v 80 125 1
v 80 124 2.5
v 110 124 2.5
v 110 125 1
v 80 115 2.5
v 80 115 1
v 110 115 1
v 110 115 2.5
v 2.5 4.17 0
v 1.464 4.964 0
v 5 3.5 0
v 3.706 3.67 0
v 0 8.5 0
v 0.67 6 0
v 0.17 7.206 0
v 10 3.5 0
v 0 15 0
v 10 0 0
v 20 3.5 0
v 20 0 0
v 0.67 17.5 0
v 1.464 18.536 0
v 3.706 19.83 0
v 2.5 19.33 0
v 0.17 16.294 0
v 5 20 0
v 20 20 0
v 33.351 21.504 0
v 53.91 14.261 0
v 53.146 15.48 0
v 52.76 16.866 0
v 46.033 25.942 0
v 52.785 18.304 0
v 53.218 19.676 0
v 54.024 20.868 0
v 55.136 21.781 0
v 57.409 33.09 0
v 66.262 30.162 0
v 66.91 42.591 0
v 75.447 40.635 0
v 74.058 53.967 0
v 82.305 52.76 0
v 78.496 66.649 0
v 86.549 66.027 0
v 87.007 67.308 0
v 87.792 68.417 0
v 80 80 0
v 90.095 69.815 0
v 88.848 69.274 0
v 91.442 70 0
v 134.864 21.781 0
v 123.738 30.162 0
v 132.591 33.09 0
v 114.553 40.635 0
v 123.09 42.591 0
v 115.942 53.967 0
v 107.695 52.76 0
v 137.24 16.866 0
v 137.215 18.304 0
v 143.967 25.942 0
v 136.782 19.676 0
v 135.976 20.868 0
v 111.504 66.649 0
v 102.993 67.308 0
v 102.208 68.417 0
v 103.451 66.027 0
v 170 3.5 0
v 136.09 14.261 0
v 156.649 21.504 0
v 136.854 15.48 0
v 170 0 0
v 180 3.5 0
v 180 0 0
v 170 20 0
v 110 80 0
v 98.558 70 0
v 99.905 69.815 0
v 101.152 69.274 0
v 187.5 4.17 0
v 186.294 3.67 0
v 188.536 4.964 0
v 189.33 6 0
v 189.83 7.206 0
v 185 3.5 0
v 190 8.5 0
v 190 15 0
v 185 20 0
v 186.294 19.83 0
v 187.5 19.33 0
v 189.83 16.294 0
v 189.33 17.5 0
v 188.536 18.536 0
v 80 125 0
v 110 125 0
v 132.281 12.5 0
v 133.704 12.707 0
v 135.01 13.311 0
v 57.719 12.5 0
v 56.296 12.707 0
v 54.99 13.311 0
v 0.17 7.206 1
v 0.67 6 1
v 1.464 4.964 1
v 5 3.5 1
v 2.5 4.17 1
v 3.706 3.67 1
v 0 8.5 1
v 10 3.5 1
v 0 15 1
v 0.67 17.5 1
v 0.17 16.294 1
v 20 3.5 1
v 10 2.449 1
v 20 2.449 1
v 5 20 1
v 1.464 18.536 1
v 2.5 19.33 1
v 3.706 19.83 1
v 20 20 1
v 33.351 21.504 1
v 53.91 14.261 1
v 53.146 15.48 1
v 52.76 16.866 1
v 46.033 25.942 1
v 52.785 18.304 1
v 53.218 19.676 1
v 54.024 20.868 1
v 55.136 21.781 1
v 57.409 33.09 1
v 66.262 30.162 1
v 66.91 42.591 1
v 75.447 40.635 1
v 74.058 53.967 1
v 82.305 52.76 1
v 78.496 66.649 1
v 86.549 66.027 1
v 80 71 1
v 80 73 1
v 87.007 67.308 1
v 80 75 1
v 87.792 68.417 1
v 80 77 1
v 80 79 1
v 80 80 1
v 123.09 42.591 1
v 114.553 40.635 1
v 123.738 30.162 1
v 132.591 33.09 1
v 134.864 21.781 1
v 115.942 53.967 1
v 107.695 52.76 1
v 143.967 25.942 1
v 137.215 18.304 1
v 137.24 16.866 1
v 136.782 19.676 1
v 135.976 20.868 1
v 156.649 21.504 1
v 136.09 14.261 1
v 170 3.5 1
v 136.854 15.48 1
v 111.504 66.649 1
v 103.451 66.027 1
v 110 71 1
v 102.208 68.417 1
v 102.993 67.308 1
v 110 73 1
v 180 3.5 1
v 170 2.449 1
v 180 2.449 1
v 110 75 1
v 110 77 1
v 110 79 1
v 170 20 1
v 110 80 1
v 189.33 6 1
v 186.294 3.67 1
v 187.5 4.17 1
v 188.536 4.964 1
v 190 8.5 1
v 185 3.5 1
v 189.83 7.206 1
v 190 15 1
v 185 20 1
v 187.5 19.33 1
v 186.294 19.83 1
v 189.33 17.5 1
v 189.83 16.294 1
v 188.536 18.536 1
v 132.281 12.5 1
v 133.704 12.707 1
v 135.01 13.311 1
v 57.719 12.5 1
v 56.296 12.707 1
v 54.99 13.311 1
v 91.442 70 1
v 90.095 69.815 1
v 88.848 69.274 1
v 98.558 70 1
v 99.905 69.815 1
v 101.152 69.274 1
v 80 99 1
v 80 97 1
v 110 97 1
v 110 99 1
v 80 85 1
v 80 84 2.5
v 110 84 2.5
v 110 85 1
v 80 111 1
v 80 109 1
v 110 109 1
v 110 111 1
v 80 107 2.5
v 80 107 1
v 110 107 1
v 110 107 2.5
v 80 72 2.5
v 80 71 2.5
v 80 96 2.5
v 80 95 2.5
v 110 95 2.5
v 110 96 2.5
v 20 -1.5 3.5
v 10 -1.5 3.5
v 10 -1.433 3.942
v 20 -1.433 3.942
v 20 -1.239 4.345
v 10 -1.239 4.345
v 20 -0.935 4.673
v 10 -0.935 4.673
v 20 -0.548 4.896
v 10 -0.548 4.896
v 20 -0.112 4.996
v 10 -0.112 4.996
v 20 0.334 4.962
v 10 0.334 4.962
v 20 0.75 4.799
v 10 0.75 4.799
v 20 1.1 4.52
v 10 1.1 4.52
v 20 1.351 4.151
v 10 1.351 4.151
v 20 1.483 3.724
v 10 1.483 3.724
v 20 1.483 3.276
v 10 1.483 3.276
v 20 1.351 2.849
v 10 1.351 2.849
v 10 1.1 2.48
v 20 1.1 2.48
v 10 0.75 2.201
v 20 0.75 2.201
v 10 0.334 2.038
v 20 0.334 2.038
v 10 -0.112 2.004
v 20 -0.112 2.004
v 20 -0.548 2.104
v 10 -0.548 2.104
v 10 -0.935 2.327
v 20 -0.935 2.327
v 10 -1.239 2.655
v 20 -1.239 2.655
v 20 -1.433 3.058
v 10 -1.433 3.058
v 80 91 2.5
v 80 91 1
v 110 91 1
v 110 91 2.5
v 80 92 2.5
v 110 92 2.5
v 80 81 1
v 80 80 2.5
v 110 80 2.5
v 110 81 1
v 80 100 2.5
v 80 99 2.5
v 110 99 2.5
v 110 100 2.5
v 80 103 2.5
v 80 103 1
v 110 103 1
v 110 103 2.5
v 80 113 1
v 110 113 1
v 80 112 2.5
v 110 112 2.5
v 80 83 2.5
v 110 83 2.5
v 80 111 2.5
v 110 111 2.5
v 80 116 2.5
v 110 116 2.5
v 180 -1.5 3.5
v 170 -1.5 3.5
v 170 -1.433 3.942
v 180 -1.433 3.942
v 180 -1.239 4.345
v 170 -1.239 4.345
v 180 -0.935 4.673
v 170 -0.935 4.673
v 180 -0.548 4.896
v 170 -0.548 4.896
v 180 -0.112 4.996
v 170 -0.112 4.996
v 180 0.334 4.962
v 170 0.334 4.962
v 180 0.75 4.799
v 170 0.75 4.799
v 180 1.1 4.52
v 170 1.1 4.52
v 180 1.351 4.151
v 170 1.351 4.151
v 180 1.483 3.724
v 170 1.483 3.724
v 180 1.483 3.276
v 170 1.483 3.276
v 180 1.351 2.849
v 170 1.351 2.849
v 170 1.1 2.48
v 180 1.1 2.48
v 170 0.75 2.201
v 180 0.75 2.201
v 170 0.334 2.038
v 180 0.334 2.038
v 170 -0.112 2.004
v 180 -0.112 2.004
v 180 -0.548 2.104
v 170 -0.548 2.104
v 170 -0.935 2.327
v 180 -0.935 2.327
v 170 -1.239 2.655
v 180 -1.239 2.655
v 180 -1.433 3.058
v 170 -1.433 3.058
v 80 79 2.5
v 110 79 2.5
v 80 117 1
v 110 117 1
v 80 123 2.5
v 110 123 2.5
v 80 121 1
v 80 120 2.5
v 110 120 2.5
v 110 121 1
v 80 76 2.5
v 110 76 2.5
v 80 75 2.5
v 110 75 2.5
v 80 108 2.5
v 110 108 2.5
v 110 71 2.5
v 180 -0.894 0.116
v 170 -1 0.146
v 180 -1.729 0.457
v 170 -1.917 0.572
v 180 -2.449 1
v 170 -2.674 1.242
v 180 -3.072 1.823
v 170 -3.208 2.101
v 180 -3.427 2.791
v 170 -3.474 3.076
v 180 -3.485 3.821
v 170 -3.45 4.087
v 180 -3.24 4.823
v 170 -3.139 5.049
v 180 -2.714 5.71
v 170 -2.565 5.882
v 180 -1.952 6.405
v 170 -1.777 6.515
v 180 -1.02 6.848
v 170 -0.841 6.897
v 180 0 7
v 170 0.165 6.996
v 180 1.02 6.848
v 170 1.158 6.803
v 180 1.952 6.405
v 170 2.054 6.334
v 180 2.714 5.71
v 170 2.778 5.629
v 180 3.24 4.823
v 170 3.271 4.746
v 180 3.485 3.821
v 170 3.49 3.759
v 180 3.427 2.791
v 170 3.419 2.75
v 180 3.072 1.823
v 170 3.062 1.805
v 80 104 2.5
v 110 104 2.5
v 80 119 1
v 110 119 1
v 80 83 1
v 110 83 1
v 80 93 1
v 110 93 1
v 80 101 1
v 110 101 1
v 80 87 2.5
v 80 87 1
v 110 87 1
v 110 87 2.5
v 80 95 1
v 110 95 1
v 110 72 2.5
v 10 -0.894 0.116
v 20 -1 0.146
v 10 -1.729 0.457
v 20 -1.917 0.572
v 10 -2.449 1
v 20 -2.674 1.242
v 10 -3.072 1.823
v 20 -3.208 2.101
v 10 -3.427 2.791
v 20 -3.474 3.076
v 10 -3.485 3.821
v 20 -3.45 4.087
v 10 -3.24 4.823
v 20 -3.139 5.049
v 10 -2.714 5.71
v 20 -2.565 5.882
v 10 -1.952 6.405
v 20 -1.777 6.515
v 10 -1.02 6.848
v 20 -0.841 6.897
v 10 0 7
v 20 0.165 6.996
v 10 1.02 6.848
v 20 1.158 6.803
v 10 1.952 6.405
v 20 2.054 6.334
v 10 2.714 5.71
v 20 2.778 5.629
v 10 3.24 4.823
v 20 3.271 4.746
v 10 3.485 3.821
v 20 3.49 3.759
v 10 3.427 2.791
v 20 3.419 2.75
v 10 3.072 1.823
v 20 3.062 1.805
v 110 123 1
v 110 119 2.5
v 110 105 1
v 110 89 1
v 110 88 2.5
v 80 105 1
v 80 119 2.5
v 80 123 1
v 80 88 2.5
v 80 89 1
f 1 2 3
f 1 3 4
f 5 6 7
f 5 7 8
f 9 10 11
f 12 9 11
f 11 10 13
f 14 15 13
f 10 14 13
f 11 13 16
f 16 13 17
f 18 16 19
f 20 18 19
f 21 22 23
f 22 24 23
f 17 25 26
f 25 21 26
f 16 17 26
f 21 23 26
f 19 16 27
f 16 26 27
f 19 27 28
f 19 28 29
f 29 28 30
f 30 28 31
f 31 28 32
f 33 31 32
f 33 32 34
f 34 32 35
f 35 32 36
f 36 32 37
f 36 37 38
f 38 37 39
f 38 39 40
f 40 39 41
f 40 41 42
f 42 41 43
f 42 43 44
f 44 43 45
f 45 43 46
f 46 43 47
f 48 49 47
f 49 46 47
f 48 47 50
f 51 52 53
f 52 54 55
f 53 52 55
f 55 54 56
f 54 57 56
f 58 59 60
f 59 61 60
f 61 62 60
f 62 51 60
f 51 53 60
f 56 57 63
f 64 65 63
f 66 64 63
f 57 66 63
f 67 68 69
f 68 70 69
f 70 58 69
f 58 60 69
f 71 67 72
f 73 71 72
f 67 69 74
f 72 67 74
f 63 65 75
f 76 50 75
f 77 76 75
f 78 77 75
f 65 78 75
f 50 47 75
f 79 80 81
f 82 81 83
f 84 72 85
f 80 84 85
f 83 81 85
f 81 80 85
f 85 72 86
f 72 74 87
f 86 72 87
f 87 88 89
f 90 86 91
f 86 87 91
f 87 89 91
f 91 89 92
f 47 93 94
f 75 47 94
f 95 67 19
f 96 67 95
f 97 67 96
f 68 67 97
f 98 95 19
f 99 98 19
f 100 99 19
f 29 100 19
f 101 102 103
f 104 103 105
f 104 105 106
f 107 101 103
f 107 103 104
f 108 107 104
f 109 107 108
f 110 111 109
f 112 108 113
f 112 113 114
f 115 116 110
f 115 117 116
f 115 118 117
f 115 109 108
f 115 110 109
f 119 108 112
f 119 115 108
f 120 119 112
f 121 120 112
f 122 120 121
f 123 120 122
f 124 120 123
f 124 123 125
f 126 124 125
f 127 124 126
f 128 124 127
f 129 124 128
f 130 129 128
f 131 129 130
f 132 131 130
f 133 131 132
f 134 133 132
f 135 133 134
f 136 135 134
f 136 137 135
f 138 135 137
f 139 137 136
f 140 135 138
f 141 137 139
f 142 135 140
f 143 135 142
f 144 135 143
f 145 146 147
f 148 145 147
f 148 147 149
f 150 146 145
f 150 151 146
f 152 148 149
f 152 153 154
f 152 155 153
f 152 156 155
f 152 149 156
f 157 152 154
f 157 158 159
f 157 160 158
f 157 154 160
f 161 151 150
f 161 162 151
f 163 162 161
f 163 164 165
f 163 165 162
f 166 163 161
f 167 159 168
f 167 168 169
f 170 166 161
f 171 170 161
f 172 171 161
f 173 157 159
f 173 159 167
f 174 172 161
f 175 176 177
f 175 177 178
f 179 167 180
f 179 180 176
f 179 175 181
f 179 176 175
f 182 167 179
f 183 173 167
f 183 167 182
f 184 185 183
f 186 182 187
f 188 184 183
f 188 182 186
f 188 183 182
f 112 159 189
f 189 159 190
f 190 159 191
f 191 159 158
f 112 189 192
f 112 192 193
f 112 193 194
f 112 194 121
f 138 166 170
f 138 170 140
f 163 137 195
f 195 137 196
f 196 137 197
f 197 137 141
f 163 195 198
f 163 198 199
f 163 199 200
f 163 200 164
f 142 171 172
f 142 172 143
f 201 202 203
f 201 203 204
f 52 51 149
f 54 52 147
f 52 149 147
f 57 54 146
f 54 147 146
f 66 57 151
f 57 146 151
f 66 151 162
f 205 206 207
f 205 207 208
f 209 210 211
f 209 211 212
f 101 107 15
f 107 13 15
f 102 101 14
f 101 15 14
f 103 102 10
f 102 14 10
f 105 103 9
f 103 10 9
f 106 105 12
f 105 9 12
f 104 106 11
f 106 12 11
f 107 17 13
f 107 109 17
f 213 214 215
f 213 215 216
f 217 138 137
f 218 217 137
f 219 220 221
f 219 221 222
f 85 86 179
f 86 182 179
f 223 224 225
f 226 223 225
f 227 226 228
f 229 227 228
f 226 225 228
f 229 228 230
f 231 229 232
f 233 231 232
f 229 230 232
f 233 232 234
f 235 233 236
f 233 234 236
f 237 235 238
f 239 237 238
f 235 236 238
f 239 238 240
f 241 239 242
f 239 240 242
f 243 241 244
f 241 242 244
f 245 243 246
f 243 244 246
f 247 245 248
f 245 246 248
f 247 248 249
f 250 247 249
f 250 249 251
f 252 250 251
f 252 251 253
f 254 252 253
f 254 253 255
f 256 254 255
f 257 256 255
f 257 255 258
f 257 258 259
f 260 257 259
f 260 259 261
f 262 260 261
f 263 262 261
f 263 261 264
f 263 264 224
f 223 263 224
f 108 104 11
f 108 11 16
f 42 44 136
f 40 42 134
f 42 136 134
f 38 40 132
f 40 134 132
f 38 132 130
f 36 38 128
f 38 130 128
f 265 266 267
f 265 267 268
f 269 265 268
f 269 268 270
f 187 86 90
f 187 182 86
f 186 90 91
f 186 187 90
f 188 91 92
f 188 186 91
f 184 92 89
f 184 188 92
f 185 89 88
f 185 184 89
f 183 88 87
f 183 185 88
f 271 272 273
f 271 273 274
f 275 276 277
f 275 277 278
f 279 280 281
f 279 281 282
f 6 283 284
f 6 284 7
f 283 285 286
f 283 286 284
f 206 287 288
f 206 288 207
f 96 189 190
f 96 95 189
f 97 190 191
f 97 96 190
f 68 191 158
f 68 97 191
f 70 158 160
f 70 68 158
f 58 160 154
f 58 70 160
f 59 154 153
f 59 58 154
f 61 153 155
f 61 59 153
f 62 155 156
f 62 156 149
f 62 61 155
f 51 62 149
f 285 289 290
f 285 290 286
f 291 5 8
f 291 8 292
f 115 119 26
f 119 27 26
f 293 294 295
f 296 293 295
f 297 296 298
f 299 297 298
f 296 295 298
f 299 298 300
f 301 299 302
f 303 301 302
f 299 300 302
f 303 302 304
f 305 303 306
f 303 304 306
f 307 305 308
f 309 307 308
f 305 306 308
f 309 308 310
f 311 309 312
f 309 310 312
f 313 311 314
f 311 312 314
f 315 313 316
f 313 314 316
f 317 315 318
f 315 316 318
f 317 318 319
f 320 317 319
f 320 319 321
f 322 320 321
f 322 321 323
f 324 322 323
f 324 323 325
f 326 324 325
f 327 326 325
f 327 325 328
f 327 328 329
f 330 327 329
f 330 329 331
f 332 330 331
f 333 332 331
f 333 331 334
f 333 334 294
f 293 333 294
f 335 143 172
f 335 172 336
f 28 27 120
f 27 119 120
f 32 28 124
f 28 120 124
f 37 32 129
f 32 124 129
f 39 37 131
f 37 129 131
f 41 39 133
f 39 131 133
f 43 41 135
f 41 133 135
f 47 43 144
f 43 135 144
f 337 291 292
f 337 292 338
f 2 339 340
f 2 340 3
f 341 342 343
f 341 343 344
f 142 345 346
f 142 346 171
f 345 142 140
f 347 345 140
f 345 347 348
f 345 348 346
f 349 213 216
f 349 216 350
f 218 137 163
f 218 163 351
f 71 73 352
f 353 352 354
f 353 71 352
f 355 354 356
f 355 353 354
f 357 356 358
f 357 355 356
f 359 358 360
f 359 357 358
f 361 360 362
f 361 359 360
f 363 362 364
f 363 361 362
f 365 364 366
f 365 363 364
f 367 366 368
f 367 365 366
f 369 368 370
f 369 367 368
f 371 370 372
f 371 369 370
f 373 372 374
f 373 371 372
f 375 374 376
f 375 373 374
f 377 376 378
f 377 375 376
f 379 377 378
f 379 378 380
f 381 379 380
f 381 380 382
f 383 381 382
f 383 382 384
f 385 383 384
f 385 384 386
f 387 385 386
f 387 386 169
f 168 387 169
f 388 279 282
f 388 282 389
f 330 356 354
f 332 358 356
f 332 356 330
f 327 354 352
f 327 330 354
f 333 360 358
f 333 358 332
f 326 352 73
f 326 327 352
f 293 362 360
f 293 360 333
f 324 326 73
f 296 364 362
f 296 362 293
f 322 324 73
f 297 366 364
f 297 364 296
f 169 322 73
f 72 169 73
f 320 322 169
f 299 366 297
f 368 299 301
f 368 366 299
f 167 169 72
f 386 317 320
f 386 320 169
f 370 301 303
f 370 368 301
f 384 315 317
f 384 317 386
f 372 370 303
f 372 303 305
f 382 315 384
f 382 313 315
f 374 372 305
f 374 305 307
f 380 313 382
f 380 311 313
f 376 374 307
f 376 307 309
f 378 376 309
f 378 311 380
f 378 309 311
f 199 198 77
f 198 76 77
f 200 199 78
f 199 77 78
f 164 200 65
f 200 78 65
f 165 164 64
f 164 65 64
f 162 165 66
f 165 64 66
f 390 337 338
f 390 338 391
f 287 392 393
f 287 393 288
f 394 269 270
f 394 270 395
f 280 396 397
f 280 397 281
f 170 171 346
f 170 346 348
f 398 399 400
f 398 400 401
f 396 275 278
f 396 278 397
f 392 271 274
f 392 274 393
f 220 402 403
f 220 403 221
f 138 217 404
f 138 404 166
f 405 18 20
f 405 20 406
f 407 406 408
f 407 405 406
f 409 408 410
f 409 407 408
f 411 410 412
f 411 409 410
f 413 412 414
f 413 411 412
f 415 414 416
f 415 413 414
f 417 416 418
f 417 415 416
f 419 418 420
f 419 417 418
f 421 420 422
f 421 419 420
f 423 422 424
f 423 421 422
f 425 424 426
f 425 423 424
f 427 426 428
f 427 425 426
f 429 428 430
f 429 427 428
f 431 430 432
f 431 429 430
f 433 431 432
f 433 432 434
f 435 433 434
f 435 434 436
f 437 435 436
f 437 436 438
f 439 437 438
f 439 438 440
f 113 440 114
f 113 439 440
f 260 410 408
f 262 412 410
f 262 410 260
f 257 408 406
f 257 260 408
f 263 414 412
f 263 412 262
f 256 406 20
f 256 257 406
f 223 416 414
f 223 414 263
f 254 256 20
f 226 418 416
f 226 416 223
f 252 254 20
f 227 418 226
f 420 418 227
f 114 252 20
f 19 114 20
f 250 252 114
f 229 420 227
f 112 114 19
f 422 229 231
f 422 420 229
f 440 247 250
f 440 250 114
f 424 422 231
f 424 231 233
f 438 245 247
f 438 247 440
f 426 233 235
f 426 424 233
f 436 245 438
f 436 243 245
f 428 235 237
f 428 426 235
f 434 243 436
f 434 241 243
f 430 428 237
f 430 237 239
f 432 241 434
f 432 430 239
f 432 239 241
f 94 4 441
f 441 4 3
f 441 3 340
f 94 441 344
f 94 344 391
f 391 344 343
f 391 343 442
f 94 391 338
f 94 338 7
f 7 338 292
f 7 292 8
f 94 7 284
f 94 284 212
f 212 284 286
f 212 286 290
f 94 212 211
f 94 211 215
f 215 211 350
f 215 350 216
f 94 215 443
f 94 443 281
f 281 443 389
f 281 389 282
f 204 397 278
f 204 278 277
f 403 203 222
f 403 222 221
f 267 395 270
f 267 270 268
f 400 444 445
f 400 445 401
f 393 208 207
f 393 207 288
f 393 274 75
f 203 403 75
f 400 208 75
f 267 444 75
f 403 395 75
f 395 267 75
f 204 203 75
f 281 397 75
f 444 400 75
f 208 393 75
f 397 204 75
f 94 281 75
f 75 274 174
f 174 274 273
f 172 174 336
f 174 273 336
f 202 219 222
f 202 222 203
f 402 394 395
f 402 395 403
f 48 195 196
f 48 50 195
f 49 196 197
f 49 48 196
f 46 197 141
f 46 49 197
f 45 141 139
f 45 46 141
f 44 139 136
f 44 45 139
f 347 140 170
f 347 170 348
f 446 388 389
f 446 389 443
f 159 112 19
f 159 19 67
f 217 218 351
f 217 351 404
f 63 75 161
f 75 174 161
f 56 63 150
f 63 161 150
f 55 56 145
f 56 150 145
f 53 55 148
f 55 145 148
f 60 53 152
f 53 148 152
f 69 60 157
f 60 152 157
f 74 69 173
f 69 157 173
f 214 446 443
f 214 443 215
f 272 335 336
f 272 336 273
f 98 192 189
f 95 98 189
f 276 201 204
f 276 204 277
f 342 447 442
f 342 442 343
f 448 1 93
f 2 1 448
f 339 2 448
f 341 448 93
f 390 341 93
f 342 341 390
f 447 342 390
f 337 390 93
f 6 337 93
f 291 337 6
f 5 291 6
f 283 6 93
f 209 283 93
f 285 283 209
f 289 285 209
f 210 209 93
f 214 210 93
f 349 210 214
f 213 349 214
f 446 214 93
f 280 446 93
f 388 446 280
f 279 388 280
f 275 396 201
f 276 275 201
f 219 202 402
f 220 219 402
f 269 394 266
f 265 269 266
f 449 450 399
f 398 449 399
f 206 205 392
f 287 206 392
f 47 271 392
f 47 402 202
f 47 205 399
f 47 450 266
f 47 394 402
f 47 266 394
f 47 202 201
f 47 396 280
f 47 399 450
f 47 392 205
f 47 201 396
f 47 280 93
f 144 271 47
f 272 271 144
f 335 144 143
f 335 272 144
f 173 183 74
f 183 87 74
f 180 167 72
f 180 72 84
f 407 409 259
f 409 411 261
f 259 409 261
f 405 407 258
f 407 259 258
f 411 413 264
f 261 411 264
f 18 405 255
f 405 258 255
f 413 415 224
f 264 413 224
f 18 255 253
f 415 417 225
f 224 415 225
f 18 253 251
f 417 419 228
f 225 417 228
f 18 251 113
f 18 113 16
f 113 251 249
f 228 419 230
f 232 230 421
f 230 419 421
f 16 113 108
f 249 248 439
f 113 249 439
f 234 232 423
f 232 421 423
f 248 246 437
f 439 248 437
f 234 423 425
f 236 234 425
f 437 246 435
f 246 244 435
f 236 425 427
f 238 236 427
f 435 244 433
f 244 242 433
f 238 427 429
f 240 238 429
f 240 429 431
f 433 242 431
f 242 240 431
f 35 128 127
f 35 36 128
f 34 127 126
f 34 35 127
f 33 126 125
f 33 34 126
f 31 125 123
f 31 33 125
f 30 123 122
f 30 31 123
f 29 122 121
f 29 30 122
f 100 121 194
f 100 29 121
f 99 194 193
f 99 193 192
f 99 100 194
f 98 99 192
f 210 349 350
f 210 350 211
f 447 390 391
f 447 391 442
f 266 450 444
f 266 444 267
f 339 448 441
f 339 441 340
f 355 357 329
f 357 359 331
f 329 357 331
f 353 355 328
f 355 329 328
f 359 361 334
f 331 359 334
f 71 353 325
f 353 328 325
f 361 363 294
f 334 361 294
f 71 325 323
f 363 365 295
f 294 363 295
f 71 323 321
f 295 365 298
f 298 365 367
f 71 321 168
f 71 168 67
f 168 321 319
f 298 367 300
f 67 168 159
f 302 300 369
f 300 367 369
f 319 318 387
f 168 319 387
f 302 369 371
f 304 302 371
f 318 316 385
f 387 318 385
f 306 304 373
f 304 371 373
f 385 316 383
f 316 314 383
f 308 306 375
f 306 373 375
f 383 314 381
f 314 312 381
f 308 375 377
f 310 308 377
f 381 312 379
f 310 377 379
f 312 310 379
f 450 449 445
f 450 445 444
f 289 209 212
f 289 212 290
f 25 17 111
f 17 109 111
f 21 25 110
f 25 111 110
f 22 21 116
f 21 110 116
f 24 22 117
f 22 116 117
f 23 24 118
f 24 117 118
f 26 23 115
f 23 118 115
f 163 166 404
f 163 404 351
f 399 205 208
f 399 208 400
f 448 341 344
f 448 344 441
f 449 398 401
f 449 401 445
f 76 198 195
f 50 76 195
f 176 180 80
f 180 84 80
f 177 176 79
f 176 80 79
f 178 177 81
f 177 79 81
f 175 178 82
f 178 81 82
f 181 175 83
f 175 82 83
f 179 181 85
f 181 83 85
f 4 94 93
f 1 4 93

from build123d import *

# Parameters (mm, degrees)
F1_DEPTH  = 1
F2_R      = 3.5
F2_R_2    = 1.5
F3_DEPTH  = 190
F4_W      = 10
F4_H      = 20
F4_W_2    = 150
F5_DEPTH  = 128.501
F6_W      = 10
F6_H      = 5.9494897428
F6_W_2    = 9.9999999999
F6_W_3    = 150
F6_H_2    = 7
F7_DEPTH  = 1.001
F8_R      = 5
F9_R      = 60
F11_DEPTH = 30
F13_DEPTH = 1.001
F14_R     = 5


with BuildPart() as f1:
    # F0 (on Top) → F1 (new body)
    with BuildSketch(Plane.XY):
        Polygon((0, 20), (0, 0), (190, 0), (190, 20), (110, 20), (110, 125), (80, 125), (80, 20), align=None)
    extrude(amount=F1_DEPTH)

    # F2 (on face) → F3 (join, through all)
    with BuildSketch(Plane(origin=(0, 0, 0), x_dir=(0, -1, 0), z_dir=(-1, 0, 0))):
        with Locations((0, 3.5)):
            Circle(F2_R)
        with Locations((0, 3.5)):
            Circle(F2_R_2, mode=Mode.SUBTRACT)
    extrude(amount=-F3_DEPTH)

    # F4 (on face) → F5 (cut, through all)
    with BuildSketch(Plane(origin=(0, 125, 0), x_dir=(-1, 0, 0), z_dir=(0, 1, 0))):
        with Locations((-185, 11)):
            Rectangle(F4_W, F4_H)
        with Locations((-5, 11)):
            Rectangle(F4_W, F4_H)
        with Locations((-95, 11)):
            Rectangle(F4_W_2, F4_H)
    extrude(amount=-F5_DEPTH, mode=Mode.SUBTRACT)

    # F6 (on face) → F7 (cut, through all)
    with BuildSketch(Plane.XY.offset(1)):
        with Locations((5, 0.5252551286)):
            Rectangle(F6_W, F6_H)
        with Locations((185.0000000001, 0.5252551286)):
            Rectangle(F6_W_2, F6_H)
        with Locations((95, 0)):
            Rectangle(F6_W_3, F6_H_2)
    extrude(amount=-F7_DEPTH, mode=Mode.SUBTRACT)

    # F8
    f8_edges = [f1.edges().sort_by_distance(p)[0] for p in [
        (0, 3.5, 0.5),
        (0, 20, 0.5),
        (190, 3.5, 0.5),
        (190, 20, 0.5),
    ]]
    fillet(f8_edges, radius=F8_R)

    # F9
    f9_edges = [f1.edges().sort_by_distance(p)[0] for p in [
        (80, 20, 0.5),
        (110, 20, 0.5),
    ]]
    fillet(f9_edges, radius=F9_R)

    # F10 (on face) → F11 (join, through all)
    with BuildSketch(Plane(origin=(80, 0, 0), x_dir=(0, -1, 0), z_dir=(-1, 0, 0))):
        Polygon((-124, 2.5), (-125, 1), (-125, 0), (-80, 0), (-69, 1), (-71, 1), (-71, 2.5), (-72, 2.5), (-73, 1), (-75, 1), (-75, 2.5), (-76, 2.5), (-77, 1), (-79, 1), (-79, 2.5), (-80, 2.5), (-81, 1), (-83, 1), (-83, 2.5), (-84, 2.5), (-85, 1), (-87, 1), (-87, 2.5), (-88, 2.5), (-89, 1), (-91, 1), (-91, 2.5), (-92, 2.5), (-93, 1), (-95, 1), (-95, 2.5), (-96, 2.5), (-97, 1), (-99, 1), (-99, 2.5), (-100, 2.5), (-101, 1), (-103, 1), (-103, 2.5), (-104, 2.5), (-105, 1), (-107, 1), (-107, 2.5), (-108, 2.5), (-109, 1), (-111, 1), (-111, 2.5), (-112, 2.5), (-113, 1), (-115, 1), (-115, 2.5), (-116, 2.5), (-117, 1), (-119, 1), (-119, 2.5), (-120, 2.5), (-121, 1), (-123, 1), (-123, 2.5), align=None)
    extrude(amount=-F11_DEPTH)

    # F12 (on face) → F13 (cut, through all)
    with BuildSketch(Plane.XY.offset(1)):
        with BuildLine():
            ThreePointArc((161.7689611834, 12.5), (122.5520004396, 31.2897614693), (102.7393131168, 70))
            Line((102.7393131168, 70), (87.2606868832, 70))
            ThreePointArc((87.2606868832, 70), (67.4479995604, 31.2897614693), (28.2310388166, 12.5))
            Line((28.2310388166, 12.5), (161.7689611834, 12.5))
        make_face()
    extrude(amount=-F13_DEPTH, mode=Mode.SUBTRACT)

    # F14
    f14_edges = [f1.edges().sort_by_distance(p)[0] for p in [
        (28.231039, 12.5, 0.5),
        (161.768961, 12.5, 0.5),
        (87.260687, 70, 0.5),
        (102.739313, 70, 0.5),
    ]]
    fillet(f14_edges, radius=F14_R)


solid = f1.part
